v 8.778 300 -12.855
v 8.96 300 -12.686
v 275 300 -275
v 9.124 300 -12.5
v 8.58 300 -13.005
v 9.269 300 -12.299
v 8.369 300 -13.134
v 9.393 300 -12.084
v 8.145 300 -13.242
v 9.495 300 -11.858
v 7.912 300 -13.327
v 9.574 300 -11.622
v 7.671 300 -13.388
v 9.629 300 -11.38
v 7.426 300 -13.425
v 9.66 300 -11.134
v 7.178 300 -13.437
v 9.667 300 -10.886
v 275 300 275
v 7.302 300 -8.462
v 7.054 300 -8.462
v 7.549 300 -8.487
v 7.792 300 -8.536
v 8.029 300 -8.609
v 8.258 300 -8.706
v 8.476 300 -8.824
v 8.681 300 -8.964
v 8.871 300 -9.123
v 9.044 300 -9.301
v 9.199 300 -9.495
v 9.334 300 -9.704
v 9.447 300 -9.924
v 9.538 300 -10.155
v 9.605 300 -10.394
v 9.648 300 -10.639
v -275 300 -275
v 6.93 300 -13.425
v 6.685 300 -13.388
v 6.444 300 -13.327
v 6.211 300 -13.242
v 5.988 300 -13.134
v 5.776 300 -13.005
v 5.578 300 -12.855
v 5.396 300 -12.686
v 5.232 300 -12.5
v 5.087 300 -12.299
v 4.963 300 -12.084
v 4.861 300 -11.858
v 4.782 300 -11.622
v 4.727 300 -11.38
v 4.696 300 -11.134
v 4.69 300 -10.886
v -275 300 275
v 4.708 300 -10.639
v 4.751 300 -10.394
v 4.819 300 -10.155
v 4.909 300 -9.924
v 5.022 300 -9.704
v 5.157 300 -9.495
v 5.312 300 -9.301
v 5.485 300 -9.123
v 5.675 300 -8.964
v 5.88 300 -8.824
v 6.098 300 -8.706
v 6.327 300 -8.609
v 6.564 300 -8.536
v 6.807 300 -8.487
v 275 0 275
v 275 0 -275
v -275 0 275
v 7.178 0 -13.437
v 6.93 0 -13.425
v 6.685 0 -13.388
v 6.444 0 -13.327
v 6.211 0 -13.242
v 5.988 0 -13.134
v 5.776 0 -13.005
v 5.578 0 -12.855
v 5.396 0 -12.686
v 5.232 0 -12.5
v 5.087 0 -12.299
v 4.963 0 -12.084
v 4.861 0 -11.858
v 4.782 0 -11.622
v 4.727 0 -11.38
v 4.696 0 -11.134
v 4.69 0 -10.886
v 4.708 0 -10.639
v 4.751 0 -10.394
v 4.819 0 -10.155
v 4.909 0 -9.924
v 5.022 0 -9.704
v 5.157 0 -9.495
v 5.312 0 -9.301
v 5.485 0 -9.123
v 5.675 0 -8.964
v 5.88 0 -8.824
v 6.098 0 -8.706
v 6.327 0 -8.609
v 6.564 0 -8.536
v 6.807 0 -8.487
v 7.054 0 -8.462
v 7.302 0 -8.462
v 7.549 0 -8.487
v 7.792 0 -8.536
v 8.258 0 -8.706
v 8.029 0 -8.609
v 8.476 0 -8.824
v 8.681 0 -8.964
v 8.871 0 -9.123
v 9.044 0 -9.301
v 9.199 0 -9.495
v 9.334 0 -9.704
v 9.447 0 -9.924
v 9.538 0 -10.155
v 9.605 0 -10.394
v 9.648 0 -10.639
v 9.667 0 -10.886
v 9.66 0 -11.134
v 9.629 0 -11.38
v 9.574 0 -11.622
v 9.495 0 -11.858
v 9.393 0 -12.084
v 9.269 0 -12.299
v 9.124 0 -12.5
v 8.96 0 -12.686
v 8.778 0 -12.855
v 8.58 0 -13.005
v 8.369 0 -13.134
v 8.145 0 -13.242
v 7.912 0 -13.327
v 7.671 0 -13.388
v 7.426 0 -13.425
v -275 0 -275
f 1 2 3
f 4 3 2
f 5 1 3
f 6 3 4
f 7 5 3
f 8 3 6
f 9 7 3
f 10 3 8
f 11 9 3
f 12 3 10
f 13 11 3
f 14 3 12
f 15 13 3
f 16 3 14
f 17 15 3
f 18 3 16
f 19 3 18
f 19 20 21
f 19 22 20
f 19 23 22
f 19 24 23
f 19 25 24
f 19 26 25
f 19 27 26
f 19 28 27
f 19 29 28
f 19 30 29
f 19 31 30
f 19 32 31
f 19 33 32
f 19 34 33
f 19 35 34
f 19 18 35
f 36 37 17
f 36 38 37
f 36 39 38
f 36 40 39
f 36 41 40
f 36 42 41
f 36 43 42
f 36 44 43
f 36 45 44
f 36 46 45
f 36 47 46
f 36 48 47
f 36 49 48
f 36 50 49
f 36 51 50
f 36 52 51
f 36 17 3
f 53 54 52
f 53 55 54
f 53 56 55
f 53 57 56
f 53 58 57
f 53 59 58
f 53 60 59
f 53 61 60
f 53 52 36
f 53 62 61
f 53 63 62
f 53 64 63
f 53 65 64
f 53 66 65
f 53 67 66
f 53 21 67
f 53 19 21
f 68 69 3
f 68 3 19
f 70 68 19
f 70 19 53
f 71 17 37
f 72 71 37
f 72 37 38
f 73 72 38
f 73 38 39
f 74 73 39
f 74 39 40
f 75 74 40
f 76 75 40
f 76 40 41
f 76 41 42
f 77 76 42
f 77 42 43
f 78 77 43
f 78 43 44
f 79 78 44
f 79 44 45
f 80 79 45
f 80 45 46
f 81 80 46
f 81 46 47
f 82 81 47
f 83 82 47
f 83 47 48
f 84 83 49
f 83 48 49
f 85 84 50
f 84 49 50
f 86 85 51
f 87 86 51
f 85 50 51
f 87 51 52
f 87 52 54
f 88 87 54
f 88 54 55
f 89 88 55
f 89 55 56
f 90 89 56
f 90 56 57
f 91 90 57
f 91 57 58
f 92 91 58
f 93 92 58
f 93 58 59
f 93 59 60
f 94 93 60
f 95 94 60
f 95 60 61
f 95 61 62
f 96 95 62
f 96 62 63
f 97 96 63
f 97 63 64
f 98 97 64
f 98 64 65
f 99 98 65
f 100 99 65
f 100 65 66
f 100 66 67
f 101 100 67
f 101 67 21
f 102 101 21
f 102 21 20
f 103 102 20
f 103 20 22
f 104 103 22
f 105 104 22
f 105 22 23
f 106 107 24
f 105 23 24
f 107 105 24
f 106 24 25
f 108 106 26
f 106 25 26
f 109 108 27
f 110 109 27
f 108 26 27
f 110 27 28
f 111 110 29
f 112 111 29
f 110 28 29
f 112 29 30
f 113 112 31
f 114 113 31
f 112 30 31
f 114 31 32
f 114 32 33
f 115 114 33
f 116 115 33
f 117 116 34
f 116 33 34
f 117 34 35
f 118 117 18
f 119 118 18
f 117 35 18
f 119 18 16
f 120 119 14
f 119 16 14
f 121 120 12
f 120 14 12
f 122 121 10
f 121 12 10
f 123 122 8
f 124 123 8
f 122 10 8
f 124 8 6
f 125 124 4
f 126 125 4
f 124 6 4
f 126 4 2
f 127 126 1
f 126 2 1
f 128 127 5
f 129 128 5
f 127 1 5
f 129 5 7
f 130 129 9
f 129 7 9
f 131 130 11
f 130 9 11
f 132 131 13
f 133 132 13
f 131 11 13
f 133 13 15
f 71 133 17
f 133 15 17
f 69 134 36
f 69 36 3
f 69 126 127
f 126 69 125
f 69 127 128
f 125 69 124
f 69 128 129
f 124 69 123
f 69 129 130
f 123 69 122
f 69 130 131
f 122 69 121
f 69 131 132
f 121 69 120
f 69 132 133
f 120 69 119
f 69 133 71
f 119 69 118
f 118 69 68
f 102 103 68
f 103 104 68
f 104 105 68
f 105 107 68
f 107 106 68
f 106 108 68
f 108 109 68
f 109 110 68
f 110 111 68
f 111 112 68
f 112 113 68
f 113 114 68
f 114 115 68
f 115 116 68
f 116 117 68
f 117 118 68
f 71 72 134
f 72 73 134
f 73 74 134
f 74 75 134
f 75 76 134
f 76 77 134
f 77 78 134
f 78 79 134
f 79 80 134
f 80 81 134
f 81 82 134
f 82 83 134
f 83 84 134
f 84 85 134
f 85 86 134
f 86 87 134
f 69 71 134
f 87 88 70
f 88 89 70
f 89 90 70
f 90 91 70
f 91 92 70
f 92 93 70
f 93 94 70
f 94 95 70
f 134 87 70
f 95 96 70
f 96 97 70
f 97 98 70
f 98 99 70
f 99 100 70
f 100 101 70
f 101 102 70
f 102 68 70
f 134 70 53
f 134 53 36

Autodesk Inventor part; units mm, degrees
ref_plane "YZ Plane" through (0, 0, 0) normal (1, 0, 0) x (0, 1, 0)
ref_plane "XZ Plane" through (0, 0, 0) normal (0, 1, 0) x (-1, 0, 0)
ref_plane "XY Plane" through (0, 0, 0) normal (0, 0, 1) x (1, 0, 0)
sketch "Esquisse1" plane through (0, 0, 0) normal (0, 1, 0) x (-1, 0, 0)
  line L0 (-275, 275) -> (275, 275)
  line L1 (275, 275) -> (275, -275)
  line L2 (275, -275) -> (-275, -275)
  line L3 (-275, -275) -> (-275, 275)
  line L4 (-275, 275) -> (275, -275) construction
  line L5 (275, 275) -> (-275, -275) construction
  point P0 (0, 0)
  dimension "d0" = 550
  dimension "d1" = 550
extrude "Extrusion1" add sketch "Esquisse1" along normal blind 300
sketch "Esquisse2" plane through (0, 0, 0) normal (0, -1, 0) x (1, 0, 0)
  point P0 (0, 0)
  point P1 (7.1781, -10.9482)
hole "Perçage1" at (7.1781, 0, -10.9482) direction (0, 1, 0) diameter 4.9784 end through all thread size "1/4-20 UNC" class "1B" standard "ANSI Unified Screw Threads"
properties part number "bloc percé"
